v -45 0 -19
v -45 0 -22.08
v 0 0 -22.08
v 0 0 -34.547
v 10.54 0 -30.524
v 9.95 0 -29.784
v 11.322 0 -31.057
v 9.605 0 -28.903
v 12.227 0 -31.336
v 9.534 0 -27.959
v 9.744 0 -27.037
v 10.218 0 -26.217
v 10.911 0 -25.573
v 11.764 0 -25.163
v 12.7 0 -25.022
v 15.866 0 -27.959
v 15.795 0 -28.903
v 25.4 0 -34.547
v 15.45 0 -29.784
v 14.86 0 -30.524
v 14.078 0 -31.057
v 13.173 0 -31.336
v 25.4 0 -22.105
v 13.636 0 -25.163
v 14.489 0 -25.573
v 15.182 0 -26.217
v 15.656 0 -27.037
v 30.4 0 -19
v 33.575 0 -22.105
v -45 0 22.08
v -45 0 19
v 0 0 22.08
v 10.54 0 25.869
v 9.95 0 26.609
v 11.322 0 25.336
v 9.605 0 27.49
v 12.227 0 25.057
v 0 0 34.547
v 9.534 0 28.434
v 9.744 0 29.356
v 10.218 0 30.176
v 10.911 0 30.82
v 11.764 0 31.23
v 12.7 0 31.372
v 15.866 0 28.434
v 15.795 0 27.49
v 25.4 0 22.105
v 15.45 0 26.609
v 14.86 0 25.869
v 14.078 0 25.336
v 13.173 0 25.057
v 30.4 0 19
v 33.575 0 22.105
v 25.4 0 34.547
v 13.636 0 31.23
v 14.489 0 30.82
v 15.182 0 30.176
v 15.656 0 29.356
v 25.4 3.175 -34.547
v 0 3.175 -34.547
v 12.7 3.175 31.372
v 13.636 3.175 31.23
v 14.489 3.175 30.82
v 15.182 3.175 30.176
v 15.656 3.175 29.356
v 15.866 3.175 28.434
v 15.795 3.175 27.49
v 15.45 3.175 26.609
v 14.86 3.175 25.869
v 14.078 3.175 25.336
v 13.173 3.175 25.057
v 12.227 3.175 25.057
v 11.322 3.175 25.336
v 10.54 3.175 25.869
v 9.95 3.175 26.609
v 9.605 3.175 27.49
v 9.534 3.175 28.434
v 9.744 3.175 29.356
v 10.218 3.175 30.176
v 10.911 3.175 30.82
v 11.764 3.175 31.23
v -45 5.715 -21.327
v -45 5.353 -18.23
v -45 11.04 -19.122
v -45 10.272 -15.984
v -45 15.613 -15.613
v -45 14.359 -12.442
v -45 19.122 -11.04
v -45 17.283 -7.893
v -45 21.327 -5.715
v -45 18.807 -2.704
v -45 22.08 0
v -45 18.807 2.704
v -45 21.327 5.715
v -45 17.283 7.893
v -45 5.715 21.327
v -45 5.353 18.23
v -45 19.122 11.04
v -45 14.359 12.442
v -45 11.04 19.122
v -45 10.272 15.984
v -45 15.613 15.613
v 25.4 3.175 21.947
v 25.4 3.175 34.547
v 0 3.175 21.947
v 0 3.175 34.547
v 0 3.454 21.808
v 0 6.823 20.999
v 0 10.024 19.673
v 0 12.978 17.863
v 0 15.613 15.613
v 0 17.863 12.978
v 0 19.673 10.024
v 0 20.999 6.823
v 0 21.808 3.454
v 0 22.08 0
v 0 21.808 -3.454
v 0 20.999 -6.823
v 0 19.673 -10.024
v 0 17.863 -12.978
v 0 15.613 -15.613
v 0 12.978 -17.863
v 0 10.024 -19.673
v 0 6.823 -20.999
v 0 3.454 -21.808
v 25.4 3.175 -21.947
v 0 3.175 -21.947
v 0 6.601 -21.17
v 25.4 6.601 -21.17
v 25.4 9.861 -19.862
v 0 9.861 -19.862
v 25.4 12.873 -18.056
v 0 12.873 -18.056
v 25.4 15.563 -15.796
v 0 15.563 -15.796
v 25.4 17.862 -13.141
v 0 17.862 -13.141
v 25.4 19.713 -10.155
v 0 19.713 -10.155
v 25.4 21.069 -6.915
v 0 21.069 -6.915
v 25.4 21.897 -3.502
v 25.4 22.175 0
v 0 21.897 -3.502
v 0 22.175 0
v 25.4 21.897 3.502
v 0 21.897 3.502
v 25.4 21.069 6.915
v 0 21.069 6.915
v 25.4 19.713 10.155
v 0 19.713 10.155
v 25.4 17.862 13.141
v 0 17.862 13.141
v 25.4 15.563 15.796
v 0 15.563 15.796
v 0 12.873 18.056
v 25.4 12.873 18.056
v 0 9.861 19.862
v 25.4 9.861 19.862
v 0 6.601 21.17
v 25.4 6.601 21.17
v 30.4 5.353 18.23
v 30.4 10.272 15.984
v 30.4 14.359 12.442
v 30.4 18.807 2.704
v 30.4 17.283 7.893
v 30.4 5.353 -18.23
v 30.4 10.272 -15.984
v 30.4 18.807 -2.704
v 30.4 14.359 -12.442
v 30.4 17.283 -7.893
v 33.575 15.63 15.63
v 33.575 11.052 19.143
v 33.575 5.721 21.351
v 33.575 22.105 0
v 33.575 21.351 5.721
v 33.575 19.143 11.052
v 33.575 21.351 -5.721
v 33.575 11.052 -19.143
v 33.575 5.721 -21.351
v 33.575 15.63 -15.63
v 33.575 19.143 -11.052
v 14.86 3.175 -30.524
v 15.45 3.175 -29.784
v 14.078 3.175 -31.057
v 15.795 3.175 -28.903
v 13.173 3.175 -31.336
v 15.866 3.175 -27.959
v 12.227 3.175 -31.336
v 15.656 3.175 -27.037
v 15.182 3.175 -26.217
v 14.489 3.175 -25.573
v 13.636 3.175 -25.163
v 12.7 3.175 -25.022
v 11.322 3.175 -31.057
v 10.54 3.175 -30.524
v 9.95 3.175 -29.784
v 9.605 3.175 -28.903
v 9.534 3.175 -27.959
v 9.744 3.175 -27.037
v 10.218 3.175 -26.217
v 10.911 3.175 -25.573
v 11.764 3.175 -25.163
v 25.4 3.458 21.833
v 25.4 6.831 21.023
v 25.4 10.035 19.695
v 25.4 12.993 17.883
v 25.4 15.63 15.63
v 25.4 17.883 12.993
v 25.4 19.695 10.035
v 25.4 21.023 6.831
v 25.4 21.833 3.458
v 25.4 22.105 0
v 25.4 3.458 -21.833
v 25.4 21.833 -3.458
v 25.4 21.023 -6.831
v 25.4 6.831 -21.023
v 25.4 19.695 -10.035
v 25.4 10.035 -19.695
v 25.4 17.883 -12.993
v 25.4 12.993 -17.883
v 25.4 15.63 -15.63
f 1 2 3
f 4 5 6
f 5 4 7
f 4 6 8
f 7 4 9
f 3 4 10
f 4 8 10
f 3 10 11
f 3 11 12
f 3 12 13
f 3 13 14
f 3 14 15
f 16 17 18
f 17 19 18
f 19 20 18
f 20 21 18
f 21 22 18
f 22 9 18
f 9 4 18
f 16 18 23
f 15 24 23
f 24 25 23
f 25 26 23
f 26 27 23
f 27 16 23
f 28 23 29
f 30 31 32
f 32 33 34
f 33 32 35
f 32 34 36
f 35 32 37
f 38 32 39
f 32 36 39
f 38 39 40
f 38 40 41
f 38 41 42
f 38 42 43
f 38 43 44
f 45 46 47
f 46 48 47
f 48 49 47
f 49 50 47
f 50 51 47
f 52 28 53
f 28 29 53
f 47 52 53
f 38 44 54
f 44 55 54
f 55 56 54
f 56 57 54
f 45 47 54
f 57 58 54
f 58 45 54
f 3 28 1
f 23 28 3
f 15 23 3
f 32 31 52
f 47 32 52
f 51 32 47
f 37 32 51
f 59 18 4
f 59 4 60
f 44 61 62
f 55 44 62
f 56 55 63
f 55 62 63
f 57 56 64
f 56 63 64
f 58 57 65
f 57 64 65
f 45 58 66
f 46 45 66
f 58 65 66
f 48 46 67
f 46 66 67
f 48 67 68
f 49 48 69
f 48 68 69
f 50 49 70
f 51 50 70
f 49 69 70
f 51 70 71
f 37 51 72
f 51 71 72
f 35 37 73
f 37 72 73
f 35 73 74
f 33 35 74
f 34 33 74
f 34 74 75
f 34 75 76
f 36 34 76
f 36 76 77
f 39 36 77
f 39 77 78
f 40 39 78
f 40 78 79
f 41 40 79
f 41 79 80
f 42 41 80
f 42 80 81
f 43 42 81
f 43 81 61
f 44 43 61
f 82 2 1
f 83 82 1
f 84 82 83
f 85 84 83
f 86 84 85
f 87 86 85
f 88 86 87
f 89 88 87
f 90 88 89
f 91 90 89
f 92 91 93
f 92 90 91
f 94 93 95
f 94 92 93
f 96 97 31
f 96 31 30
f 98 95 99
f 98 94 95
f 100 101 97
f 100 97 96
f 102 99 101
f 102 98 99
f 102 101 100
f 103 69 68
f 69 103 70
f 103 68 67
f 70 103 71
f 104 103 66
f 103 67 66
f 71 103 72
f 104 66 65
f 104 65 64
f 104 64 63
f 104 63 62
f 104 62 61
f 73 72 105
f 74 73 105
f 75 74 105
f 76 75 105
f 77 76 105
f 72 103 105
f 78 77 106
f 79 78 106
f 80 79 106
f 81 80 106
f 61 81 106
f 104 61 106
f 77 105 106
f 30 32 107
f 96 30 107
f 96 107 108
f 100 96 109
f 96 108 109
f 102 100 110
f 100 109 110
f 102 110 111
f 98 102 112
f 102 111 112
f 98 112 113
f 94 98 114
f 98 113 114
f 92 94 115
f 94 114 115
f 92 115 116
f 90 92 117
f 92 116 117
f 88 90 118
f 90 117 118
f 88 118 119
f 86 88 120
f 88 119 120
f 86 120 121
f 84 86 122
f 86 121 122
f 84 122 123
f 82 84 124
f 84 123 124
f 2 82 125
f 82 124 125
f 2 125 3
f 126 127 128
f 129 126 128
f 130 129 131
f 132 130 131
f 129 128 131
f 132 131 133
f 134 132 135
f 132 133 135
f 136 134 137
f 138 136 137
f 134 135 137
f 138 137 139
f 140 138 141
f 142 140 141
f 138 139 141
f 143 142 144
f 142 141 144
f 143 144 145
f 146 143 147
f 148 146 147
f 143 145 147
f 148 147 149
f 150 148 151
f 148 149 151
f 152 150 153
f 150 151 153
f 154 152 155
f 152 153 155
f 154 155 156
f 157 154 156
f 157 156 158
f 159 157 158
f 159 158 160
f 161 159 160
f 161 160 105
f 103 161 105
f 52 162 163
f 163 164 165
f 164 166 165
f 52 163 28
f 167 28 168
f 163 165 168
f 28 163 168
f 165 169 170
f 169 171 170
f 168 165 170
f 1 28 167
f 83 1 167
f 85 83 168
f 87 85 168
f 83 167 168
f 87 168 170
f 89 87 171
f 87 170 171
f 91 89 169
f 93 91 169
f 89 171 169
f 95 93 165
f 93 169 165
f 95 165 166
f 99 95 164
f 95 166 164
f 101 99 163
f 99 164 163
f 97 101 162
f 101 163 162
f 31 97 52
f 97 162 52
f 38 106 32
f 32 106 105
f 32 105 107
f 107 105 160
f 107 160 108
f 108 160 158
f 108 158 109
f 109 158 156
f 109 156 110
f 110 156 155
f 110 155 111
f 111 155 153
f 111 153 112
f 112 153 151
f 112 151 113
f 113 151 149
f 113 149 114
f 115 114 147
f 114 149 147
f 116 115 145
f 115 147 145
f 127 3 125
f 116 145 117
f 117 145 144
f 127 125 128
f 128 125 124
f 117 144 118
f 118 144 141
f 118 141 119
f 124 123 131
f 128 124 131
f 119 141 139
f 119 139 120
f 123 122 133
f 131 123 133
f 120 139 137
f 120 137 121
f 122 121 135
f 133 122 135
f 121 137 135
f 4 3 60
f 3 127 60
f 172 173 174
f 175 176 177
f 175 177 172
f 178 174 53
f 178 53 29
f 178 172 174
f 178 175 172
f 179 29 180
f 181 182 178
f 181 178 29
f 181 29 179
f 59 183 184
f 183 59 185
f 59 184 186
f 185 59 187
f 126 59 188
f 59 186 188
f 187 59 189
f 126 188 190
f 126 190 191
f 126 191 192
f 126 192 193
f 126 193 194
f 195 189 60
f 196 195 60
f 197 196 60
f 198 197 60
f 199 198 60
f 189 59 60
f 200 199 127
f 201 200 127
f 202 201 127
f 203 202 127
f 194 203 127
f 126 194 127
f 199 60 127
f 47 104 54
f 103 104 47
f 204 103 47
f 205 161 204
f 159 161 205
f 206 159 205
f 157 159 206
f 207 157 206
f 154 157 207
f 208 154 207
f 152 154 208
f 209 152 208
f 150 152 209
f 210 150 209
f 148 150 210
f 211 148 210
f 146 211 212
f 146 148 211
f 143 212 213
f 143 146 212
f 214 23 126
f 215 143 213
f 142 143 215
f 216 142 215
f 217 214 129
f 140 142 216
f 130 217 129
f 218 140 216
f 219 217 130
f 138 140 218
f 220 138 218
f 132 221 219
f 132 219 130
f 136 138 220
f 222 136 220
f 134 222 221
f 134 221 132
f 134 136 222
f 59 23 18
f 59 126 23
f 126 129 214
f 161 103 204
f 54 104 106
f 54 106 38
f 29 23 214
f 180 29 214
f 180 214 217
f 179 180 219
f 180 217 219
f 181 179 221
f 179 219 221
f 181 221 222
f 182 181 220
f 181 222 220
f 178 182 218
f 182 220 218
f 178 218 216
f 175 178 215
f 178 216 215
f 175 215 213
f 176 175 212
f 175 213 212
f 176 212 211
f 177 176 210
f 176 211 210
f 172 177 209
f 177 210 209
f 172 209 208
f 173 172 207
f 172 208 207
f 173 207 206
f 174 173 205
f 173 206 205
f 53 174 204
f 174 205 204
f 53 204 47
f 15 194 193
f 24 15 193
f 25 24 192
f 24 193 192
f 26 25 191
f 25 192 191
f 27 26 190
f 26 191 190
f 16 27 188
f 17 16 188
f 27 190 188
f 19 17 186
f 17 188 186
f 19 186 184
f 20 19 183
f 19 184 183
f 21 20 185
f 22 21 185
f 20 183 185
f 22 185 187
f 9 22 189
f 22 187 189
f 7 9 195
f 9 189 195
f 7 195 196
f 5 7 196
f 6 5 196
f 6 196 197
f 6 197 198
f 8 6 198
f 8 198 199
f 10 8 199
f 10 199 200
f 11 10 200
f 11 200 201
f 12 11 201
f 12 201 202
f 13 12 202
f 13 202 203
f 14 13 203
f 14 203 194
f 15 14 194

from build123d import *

# Parameters (mm, degrees)
BOSS_EXTRUDE1_DEPTH = 25.4
SKETCH2_R           = 3.175
CUT_EXTRUDE1_DEPTH  = 25.4
SKETCH3_R           = 3.175
CUT_EXTRUDE2_DEPTH  = 25.4
BOSS_EXTRUDE2_DEPTH = 5
BOSS_EXTRUDE3_DEPTH = 3.175
BOSS_EXTRUDE4_DEPTH = 45


with BuildPart() as part:
    # Sketch1 → Boss-Extrude1 (new body)
    with BuildSketch(Plane(origin=(0, 0, 0), x_dir=(0, 0, -1), z_dir=(1, 0, 0))):
        with BuildLine():
            Line((19, 0), (34.546525921, 0))
            Line((34.546525921, 0), (34.546525921, 3.175))
            Line((34.546525921, 3.175), (21.946525921, 3.175))
            ThreePointArc((21.946525921, 3.175), (0, 22.175), (-21.946525921, 3.175))
            Line((-21.946525921, 3.175), (-34.546525921, 3.175))
            Line((-34.546525921, 3.175), (-34.546525921, 0))
            Line((-34.546525921, 0), (-19, 0))
            ThreePointArc((-19, 0), (0, 19), (19, 0))
        make_face()
    extrude(amount=BOSS_EXTRUDE1_DEPTH)

    # Sketch2 → Cut-Extrude1 (cut)
    with BuildSketch(Plane(origin=(0, 3.175, 0), x_dir=(1, 0, 0), z_dir=(0, 1, 0))):
        with Locations(Location((12.7, -28.196525921, 0), (0, 0, 270))):
            Circle(SKETCH2_R)
    extrude(amount=-CUT_EXTRUDE1_DEPTH, mode=Mode.SUBTRACT)

    # Sketch3 → Cut-Extrude2 (cut)
    with BuildSketch(Plane(origin=(0, 3.175, 0), x_dir=(1, 0, 0), z_dir=(0, 1, 0))):
        with Locations(Location((12.7, 28.196525921, 0), (0, 0, 270))):
            Circle(SKETCH3_R)
    extrude(amount=-CUT_EXTRUDE2_DEPTH, mode=Mode.SUBTRACT)

    # Sketch4 → Boss-Extrude2 (add)
    with BuildSketch(Plane(origin=(25.4, 0, 0), x_dir=(0, 0, -1), z_dir=(1, 0, 0))):
        with BuildLine():
            Line((-22.104651978, 0), (-19, 0))
            ThreePointArc((-19, 0), (0, 19), (19, 0))
            Line((19, 0), (22.104651978, 0))
            ThreePointArc((22.104651978, 0), (0, 22.104651978), (-22.104651978, 0))
        make_face()
    extrude(amount=BOSS_EXTRUDE2_DEPTH)

    # Sketch5 → Boss-Extrude3 (add)
    with BuildSketch(Plane(origin=(30.4, 0, 0), x_dir=(0, 0, -1), z_dir=(1, 0, 0))):
        with BuildLine():
            ThreePointArc((22.104651978, 0), (0, 22.104651978), (-22.104651978, 0))
            Line((-22.104651978, 0), (22.104651978, 0))
        make_face()
    extrude(amount=BOSS_EXTRUDE3_DEPTH)

    # Sketch6 → Boss-Extrude4 (add)
    with BuildSketch(Plane.ZY):
        with BuildLine():
            ThreePointArc((-19, 0), (0, 19), (19, 0))
            Line((19, 0), (21.402036048, 0))
            Line((21.402036048, 0), (22.079689898, 0))
            ThreePointArc((22.079689898, 0), (0, 22.079689898), (-22.079689898, 0))
            Line((-22.079689898, 0), (-19, 0))
        make_face()
    extrude(amount=BOSS_EXTRUDE4_DEPTH)


solid = part.part
